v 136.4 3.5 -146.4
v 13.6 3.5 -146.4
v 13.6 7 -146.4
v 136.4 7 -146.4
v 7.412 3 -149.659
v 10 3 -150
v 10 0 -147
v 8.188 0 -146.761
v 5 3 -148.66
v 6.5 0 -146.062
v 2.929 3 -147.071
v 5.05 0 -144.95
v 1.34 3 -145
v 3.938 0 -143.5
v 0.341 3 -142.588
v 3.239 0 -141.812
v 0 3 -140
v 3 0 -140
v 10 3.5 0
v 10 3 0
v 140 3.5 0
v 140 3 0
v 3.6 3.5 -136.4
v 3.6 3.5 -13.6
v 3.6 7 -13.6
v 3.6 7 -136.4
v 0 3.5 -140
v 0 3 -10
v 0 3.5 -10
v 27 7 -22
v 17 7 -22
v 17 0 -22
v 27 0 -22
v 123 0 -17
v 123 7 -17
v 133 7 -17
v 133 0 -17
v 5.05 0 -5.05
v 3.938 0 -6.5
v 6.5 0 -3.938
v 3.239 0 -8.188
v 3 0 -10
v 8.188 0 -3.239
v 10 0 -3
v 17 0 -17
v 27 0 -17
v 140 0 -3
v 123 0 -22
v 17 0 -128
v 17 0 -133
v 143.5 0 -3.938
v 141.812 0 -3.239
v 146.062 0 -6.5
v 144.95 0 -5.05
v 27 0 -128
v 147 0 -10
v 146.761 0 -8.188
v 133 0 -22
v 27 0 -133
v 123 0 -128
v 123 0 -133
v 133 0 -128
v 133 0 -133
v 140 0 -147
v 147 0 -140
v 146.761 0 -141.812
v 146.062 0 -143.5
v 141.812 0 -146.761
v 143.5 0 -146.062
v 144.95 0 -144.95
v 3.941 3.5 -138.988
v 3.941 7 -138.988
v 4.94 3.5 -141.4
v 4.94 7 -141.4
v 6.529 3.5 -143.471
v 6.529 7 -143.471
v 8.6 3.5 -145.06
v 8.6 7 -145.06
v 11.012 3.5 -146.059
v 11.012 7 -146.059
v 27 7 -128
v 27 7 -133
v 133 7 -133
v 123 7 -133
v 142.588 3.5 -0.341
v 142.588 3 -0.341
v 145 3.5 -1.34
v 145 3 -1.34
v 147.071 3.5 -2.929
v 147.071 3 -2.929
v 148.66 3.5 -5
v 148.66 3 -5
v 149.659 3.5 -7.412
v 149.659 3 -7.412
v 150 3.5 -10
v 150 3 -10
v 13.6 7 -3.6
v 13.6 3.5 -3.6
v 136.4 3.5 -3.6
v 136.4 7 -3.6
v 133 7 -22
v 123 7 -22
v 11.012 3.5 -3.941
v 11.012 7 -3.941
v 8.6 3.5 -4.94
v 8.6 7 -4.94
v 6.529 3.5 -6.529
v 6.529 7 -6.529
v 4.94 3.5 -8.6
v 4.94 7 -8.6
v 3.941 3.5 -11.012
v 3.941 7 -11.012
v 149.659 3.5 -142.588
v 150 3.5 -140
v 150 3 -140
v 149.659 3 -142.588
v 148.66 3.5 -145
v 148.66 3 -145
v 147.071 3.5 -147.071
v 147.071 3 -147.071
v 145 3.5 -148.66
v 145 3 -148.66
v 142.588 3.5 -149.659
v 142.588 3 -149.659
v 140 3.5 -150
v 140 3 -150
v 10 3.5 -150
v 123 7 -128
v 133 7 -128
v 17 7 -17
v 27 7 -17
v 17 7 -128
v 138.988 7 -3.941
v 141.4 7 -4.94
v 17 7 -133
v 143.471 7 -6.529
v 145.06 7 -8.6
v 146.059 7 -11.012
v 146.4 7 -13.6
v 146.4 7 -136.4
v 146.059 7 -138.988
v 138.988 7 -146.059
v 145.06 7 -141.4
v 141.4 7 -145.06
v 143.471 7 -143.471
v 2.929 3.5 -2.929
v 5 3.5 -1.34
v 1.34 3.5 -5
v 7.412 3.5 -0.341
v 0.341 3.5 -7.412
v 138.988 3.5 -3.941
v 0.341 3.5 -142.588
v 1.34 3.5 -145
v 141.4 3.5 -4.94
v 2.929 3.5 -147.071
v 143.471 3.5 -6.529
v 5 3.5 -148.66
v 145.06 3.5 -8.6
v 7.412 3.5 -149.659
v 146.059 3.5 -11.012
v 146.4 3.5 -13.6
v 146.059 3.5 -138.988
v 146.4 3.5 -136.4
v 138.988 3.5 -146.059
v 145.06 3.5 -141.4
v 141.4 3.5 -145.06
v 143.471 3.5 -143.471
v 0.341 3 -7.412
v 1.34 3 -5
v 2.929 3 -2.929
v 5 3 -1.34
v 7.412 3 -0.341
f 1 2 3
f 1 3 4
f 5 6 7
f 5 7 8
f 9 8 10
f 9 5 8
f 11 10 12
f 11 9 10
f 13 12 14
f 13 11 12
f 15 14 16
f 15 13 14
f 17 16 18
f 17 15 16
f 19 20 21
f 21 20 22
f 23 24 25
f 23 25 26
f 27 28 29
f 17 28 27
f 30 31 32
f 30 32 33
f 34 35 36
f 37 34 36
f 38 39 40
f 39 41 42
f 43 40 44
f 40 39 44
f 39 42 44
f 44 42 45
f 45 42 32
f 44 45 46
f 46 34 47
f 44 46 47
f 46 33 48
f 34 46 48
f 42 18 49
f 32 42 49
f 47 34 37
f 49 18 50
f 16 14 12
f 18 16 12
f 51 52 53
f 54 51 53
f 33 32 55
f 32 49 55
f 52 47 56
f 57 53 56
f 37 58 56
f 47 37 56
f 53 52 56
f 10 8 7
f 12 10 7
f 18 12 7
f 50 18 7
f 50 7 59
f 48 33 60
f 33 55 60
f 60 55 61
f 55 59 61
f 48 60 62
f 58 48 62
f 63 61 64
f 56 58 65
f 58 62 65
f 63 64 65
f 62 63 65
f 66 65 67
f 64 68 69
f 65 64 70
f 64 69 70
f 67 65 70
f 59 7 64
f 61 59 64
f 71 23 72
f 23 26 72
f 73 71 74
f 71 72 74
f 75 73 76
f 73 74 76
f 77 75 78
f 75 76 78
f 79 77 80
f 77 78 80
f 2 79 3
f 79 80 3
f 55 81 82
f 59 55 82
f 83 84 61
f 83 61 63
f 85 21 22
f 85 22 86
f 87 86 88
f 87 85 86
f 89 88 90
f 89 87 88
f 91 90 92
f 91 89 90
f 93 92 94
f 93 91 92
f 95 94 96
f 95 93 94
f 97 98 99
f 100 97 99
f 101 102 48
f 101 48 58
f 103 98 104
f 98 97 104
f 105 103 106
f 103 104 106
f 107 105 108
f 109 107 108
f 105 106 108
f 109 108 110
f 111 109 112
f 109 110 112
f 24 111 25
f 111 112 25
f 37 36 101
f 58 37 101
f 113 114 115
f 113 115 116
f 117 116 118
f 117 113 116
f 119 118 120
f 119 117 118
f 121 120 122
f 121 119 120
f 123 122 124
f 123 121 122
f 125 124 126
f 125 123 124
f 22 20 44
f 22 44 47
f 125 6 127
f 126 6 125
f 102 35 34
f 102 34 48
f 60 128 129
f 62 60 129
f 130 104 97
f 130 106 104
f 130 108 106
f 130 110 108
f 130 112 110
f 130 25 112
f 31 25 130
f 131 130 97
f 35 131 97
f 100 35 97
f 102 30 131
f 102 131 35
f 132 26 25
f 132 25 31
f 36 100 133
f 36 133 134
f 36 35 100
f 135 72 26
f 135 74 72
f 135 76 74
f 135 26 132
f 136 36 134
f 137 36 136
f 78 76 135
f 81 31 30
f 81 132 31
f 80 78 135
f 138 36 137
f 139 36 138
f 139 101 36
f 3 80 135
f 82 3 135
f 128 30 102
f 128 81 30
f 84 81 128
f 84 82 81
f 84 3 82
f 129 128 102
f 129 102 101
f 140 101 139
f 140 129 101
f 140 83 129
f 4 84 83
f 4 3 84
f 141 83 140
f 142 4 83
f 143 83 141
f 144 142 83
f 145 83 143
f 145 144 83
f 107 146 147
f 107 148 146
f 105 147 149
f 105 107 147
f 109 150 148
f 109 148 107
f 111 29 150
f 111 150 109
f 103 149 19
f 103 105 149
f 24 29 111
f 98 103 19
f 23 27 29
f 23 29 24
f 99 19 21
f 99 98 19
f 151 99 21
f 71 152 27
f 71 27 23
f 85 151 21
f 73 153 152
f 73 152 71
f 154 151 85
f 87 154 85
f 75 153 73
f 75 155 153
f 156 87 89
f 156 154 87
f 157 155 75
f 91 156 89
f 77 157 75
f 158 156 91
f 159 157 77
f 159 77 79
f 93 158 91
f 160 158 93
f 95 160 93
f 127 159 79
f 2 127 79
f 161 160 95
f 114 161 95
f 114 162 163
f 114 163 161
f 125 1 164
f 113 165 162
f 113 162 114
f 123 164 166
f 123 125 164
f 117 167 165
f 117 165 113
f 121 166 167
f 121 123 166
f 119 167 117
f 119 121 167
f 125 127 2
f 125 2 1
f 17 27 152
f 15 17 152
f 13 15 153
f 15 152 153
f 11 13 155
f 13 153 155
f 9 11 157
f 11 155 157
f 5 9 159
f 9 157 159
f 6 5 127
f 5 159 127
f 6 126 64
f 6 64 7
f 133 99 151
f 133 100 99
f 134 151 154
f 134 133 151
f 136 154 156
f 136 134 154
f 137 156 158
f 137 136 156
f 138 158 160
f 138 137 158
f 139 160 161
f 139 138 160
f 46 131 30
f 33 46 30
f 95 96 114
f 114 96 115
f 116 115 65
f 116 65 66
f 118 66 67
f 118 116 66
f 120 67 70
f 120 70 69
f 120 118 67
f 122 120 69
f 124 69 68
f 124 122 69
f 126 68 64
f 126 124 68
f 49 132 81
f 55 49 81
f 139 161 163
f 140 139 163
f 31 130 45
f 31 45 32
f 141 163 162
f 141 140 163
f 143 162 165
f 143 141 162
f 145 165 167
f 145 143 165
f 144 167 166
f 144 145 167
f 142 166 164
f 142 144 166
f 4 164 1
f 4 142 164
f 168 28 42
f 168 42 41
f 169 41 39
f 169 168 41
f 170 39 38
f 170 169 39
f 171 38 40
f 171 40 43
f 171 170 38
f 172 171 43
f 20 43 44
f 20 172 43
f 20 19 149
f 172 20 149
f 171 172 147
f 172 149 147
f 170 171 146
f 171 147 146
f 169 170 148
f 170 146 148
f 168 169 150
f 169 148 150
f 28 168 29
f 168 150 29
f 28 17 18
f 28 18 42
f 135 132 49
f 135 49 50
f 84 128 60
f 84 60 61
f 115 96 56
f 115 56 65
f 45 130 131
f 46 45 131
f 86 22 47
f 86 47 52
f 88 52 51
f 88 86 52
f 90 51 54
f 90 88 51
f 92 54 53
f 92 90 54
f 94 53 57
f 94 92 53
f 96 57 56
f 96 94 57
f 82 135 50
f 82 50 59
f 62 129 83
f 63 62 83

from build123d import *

# Parameters (mm, degrees)
SKETCH1_W           = 150
SKETCH1_H           = 150
BOSS_EXTRUDE1_DEPTH = 3.5
SKETCH2_W           = 142.8
SKETCH2_H           = 142.8
BOSS_EXTRUDE2_DEPTH = 3.5
FILLET9_R           = 10
FILLET10_R          = 10
CHAMFER3_SIZE       = 3
SKETCH3_W           = 10
SKETCH3_H           = 5
CUT_EXTRUDE1_DEPTH  = 10
SKETCH4_W           = 10
SKETCH4_H           = 5
CUT_EXTRUDE2_DEPTH  = 10
SKETCH5_W           = 10
SKETCH5_H           = 5
CUT_EXTRUDE3_DEPTH  = 10
SKETCH6_W           = 10
SKETCH6_H           = 5
CUT_EXTRUDE4_DEPTH  = 10


with BuildPart() as part:
    # Sketch1 → Boss-Extrude1 (new body)
    with BuildSketch(Plane(origin=(0, 0, 0), x_dir=(1, 0, 0), z_dir=(0, 1, 0))):
        with Locations((75, 75)):
            Rectangle(SKETCH1_W, SKETCH1_H)
    extrude(amount=BOSS_EXTRUDE1_DEPTH)

    # Sketch2 → Boss-Extrude2 (add)
    with BuildSketch(Plane(origin=(0, 3.5, 0), x_dir=(1, 0, 0), z_dir=(0, 1, 0))):
        with Locations((75, 75)):
            Rectangle(SKETCH2_W, SKETCH2_H)
    extrude(amount=BOSS_EXTRUDE2_DEPTH)

    # Fillet9
    fillet9_edges = [part.edges().sort_by_distance(p)[0] for p in [
        (146.4, 5.25, -3.6),
        (150, 1.75, 0),
    ]]
    fillet(fillet9_edges, radius=FILLET9_R)

    # Fillet10
    fillet10_edges = [part.edges().sort_by_distance(p)[0] for p in [
        (3.6, 5.25, -146.4),
        (3.6, 5.25, -3.6),
        (146.4, 5.25, -146.4),
        (0, 1.75, -150),
        (150, 1.75, -150),
        (0, 1.75, 0),
    ]]
    fillet(fillet10_edges, radius=FILLET10_R)

    # Chamfer3
    chamfer3_edges = [part.edges().sort_by_distance(p)[0] for p in [
        (150, 0, -75),
        (147.071067812, 0, -2.928932188),
        (0, 0, -75),
        (75, 0, 0),
        (75, 0, -150),
        (147.071067812, 0, -147.071067812),
        (2.928932188, 0, -2.928932188),
        (2.928932188, 0, -147.071067812),
    ]]
    chamfer(chamfer3_edges, length=CHAMFER3_SIZE)

    # Sketch3 → Cut-Extrude1 (cut)
    with BuildSketch(Plane(origin=(0, 7, 0), x_dir=(1, 0, 0), z_dir=(0, 1, 0))):
        with Locations((22, 19.5)):
            Rectangle(SKETCH3_W, SKETCH3_H)
    extrude(amount=-CUT_EXTRUDE1_DEPTH, mode=Mode.SUBTRACT)

    # Sketch4 → Cut-Extrude2 (cut)
    with BuildSketch(Plane(origin=(0, 7, 0), x_dir=(1, 0, 0), z_dir=(0, 1, 0))):
        with Locations((22, 130.5)):
            Rectangle(SKETCH4_W, SKETCH4_H)
    extrude(amount=-CUT_EXTRUDE2_DEPTH, mode=Mode.SUBTRACT)

    # Sketch5 → Cut-Extrude3 (cut)
    with BuildSketch(Plane(origin=(0, 7, 0), x_dir=(1, 0, 0), z_dir=(0, 1, 0))):
        with Locations((128, 19.5)):
            Rectangle(SKETCH5_W, SKETCH5_H)
    extrude(amount=-CUT_EXTRUDE3_DEPTH, mode=Mode.SUBTRACT)

    # Sketch6 → Cut-Extrude4 (cut)
    with BuildSketch(Plane(origin=(0, 7, 0), x_dir=(1, 0, 0), z_dir=(0, 1, 0))):
        with Locations((128, 130.5)):
            Rectangle(SKETCH6_W, SKETCH6_H)
    extrude(amount=-CUT_EXTRUDE4_DEPTH, mode=Mode.SUBTRACT)


solid = part.part
